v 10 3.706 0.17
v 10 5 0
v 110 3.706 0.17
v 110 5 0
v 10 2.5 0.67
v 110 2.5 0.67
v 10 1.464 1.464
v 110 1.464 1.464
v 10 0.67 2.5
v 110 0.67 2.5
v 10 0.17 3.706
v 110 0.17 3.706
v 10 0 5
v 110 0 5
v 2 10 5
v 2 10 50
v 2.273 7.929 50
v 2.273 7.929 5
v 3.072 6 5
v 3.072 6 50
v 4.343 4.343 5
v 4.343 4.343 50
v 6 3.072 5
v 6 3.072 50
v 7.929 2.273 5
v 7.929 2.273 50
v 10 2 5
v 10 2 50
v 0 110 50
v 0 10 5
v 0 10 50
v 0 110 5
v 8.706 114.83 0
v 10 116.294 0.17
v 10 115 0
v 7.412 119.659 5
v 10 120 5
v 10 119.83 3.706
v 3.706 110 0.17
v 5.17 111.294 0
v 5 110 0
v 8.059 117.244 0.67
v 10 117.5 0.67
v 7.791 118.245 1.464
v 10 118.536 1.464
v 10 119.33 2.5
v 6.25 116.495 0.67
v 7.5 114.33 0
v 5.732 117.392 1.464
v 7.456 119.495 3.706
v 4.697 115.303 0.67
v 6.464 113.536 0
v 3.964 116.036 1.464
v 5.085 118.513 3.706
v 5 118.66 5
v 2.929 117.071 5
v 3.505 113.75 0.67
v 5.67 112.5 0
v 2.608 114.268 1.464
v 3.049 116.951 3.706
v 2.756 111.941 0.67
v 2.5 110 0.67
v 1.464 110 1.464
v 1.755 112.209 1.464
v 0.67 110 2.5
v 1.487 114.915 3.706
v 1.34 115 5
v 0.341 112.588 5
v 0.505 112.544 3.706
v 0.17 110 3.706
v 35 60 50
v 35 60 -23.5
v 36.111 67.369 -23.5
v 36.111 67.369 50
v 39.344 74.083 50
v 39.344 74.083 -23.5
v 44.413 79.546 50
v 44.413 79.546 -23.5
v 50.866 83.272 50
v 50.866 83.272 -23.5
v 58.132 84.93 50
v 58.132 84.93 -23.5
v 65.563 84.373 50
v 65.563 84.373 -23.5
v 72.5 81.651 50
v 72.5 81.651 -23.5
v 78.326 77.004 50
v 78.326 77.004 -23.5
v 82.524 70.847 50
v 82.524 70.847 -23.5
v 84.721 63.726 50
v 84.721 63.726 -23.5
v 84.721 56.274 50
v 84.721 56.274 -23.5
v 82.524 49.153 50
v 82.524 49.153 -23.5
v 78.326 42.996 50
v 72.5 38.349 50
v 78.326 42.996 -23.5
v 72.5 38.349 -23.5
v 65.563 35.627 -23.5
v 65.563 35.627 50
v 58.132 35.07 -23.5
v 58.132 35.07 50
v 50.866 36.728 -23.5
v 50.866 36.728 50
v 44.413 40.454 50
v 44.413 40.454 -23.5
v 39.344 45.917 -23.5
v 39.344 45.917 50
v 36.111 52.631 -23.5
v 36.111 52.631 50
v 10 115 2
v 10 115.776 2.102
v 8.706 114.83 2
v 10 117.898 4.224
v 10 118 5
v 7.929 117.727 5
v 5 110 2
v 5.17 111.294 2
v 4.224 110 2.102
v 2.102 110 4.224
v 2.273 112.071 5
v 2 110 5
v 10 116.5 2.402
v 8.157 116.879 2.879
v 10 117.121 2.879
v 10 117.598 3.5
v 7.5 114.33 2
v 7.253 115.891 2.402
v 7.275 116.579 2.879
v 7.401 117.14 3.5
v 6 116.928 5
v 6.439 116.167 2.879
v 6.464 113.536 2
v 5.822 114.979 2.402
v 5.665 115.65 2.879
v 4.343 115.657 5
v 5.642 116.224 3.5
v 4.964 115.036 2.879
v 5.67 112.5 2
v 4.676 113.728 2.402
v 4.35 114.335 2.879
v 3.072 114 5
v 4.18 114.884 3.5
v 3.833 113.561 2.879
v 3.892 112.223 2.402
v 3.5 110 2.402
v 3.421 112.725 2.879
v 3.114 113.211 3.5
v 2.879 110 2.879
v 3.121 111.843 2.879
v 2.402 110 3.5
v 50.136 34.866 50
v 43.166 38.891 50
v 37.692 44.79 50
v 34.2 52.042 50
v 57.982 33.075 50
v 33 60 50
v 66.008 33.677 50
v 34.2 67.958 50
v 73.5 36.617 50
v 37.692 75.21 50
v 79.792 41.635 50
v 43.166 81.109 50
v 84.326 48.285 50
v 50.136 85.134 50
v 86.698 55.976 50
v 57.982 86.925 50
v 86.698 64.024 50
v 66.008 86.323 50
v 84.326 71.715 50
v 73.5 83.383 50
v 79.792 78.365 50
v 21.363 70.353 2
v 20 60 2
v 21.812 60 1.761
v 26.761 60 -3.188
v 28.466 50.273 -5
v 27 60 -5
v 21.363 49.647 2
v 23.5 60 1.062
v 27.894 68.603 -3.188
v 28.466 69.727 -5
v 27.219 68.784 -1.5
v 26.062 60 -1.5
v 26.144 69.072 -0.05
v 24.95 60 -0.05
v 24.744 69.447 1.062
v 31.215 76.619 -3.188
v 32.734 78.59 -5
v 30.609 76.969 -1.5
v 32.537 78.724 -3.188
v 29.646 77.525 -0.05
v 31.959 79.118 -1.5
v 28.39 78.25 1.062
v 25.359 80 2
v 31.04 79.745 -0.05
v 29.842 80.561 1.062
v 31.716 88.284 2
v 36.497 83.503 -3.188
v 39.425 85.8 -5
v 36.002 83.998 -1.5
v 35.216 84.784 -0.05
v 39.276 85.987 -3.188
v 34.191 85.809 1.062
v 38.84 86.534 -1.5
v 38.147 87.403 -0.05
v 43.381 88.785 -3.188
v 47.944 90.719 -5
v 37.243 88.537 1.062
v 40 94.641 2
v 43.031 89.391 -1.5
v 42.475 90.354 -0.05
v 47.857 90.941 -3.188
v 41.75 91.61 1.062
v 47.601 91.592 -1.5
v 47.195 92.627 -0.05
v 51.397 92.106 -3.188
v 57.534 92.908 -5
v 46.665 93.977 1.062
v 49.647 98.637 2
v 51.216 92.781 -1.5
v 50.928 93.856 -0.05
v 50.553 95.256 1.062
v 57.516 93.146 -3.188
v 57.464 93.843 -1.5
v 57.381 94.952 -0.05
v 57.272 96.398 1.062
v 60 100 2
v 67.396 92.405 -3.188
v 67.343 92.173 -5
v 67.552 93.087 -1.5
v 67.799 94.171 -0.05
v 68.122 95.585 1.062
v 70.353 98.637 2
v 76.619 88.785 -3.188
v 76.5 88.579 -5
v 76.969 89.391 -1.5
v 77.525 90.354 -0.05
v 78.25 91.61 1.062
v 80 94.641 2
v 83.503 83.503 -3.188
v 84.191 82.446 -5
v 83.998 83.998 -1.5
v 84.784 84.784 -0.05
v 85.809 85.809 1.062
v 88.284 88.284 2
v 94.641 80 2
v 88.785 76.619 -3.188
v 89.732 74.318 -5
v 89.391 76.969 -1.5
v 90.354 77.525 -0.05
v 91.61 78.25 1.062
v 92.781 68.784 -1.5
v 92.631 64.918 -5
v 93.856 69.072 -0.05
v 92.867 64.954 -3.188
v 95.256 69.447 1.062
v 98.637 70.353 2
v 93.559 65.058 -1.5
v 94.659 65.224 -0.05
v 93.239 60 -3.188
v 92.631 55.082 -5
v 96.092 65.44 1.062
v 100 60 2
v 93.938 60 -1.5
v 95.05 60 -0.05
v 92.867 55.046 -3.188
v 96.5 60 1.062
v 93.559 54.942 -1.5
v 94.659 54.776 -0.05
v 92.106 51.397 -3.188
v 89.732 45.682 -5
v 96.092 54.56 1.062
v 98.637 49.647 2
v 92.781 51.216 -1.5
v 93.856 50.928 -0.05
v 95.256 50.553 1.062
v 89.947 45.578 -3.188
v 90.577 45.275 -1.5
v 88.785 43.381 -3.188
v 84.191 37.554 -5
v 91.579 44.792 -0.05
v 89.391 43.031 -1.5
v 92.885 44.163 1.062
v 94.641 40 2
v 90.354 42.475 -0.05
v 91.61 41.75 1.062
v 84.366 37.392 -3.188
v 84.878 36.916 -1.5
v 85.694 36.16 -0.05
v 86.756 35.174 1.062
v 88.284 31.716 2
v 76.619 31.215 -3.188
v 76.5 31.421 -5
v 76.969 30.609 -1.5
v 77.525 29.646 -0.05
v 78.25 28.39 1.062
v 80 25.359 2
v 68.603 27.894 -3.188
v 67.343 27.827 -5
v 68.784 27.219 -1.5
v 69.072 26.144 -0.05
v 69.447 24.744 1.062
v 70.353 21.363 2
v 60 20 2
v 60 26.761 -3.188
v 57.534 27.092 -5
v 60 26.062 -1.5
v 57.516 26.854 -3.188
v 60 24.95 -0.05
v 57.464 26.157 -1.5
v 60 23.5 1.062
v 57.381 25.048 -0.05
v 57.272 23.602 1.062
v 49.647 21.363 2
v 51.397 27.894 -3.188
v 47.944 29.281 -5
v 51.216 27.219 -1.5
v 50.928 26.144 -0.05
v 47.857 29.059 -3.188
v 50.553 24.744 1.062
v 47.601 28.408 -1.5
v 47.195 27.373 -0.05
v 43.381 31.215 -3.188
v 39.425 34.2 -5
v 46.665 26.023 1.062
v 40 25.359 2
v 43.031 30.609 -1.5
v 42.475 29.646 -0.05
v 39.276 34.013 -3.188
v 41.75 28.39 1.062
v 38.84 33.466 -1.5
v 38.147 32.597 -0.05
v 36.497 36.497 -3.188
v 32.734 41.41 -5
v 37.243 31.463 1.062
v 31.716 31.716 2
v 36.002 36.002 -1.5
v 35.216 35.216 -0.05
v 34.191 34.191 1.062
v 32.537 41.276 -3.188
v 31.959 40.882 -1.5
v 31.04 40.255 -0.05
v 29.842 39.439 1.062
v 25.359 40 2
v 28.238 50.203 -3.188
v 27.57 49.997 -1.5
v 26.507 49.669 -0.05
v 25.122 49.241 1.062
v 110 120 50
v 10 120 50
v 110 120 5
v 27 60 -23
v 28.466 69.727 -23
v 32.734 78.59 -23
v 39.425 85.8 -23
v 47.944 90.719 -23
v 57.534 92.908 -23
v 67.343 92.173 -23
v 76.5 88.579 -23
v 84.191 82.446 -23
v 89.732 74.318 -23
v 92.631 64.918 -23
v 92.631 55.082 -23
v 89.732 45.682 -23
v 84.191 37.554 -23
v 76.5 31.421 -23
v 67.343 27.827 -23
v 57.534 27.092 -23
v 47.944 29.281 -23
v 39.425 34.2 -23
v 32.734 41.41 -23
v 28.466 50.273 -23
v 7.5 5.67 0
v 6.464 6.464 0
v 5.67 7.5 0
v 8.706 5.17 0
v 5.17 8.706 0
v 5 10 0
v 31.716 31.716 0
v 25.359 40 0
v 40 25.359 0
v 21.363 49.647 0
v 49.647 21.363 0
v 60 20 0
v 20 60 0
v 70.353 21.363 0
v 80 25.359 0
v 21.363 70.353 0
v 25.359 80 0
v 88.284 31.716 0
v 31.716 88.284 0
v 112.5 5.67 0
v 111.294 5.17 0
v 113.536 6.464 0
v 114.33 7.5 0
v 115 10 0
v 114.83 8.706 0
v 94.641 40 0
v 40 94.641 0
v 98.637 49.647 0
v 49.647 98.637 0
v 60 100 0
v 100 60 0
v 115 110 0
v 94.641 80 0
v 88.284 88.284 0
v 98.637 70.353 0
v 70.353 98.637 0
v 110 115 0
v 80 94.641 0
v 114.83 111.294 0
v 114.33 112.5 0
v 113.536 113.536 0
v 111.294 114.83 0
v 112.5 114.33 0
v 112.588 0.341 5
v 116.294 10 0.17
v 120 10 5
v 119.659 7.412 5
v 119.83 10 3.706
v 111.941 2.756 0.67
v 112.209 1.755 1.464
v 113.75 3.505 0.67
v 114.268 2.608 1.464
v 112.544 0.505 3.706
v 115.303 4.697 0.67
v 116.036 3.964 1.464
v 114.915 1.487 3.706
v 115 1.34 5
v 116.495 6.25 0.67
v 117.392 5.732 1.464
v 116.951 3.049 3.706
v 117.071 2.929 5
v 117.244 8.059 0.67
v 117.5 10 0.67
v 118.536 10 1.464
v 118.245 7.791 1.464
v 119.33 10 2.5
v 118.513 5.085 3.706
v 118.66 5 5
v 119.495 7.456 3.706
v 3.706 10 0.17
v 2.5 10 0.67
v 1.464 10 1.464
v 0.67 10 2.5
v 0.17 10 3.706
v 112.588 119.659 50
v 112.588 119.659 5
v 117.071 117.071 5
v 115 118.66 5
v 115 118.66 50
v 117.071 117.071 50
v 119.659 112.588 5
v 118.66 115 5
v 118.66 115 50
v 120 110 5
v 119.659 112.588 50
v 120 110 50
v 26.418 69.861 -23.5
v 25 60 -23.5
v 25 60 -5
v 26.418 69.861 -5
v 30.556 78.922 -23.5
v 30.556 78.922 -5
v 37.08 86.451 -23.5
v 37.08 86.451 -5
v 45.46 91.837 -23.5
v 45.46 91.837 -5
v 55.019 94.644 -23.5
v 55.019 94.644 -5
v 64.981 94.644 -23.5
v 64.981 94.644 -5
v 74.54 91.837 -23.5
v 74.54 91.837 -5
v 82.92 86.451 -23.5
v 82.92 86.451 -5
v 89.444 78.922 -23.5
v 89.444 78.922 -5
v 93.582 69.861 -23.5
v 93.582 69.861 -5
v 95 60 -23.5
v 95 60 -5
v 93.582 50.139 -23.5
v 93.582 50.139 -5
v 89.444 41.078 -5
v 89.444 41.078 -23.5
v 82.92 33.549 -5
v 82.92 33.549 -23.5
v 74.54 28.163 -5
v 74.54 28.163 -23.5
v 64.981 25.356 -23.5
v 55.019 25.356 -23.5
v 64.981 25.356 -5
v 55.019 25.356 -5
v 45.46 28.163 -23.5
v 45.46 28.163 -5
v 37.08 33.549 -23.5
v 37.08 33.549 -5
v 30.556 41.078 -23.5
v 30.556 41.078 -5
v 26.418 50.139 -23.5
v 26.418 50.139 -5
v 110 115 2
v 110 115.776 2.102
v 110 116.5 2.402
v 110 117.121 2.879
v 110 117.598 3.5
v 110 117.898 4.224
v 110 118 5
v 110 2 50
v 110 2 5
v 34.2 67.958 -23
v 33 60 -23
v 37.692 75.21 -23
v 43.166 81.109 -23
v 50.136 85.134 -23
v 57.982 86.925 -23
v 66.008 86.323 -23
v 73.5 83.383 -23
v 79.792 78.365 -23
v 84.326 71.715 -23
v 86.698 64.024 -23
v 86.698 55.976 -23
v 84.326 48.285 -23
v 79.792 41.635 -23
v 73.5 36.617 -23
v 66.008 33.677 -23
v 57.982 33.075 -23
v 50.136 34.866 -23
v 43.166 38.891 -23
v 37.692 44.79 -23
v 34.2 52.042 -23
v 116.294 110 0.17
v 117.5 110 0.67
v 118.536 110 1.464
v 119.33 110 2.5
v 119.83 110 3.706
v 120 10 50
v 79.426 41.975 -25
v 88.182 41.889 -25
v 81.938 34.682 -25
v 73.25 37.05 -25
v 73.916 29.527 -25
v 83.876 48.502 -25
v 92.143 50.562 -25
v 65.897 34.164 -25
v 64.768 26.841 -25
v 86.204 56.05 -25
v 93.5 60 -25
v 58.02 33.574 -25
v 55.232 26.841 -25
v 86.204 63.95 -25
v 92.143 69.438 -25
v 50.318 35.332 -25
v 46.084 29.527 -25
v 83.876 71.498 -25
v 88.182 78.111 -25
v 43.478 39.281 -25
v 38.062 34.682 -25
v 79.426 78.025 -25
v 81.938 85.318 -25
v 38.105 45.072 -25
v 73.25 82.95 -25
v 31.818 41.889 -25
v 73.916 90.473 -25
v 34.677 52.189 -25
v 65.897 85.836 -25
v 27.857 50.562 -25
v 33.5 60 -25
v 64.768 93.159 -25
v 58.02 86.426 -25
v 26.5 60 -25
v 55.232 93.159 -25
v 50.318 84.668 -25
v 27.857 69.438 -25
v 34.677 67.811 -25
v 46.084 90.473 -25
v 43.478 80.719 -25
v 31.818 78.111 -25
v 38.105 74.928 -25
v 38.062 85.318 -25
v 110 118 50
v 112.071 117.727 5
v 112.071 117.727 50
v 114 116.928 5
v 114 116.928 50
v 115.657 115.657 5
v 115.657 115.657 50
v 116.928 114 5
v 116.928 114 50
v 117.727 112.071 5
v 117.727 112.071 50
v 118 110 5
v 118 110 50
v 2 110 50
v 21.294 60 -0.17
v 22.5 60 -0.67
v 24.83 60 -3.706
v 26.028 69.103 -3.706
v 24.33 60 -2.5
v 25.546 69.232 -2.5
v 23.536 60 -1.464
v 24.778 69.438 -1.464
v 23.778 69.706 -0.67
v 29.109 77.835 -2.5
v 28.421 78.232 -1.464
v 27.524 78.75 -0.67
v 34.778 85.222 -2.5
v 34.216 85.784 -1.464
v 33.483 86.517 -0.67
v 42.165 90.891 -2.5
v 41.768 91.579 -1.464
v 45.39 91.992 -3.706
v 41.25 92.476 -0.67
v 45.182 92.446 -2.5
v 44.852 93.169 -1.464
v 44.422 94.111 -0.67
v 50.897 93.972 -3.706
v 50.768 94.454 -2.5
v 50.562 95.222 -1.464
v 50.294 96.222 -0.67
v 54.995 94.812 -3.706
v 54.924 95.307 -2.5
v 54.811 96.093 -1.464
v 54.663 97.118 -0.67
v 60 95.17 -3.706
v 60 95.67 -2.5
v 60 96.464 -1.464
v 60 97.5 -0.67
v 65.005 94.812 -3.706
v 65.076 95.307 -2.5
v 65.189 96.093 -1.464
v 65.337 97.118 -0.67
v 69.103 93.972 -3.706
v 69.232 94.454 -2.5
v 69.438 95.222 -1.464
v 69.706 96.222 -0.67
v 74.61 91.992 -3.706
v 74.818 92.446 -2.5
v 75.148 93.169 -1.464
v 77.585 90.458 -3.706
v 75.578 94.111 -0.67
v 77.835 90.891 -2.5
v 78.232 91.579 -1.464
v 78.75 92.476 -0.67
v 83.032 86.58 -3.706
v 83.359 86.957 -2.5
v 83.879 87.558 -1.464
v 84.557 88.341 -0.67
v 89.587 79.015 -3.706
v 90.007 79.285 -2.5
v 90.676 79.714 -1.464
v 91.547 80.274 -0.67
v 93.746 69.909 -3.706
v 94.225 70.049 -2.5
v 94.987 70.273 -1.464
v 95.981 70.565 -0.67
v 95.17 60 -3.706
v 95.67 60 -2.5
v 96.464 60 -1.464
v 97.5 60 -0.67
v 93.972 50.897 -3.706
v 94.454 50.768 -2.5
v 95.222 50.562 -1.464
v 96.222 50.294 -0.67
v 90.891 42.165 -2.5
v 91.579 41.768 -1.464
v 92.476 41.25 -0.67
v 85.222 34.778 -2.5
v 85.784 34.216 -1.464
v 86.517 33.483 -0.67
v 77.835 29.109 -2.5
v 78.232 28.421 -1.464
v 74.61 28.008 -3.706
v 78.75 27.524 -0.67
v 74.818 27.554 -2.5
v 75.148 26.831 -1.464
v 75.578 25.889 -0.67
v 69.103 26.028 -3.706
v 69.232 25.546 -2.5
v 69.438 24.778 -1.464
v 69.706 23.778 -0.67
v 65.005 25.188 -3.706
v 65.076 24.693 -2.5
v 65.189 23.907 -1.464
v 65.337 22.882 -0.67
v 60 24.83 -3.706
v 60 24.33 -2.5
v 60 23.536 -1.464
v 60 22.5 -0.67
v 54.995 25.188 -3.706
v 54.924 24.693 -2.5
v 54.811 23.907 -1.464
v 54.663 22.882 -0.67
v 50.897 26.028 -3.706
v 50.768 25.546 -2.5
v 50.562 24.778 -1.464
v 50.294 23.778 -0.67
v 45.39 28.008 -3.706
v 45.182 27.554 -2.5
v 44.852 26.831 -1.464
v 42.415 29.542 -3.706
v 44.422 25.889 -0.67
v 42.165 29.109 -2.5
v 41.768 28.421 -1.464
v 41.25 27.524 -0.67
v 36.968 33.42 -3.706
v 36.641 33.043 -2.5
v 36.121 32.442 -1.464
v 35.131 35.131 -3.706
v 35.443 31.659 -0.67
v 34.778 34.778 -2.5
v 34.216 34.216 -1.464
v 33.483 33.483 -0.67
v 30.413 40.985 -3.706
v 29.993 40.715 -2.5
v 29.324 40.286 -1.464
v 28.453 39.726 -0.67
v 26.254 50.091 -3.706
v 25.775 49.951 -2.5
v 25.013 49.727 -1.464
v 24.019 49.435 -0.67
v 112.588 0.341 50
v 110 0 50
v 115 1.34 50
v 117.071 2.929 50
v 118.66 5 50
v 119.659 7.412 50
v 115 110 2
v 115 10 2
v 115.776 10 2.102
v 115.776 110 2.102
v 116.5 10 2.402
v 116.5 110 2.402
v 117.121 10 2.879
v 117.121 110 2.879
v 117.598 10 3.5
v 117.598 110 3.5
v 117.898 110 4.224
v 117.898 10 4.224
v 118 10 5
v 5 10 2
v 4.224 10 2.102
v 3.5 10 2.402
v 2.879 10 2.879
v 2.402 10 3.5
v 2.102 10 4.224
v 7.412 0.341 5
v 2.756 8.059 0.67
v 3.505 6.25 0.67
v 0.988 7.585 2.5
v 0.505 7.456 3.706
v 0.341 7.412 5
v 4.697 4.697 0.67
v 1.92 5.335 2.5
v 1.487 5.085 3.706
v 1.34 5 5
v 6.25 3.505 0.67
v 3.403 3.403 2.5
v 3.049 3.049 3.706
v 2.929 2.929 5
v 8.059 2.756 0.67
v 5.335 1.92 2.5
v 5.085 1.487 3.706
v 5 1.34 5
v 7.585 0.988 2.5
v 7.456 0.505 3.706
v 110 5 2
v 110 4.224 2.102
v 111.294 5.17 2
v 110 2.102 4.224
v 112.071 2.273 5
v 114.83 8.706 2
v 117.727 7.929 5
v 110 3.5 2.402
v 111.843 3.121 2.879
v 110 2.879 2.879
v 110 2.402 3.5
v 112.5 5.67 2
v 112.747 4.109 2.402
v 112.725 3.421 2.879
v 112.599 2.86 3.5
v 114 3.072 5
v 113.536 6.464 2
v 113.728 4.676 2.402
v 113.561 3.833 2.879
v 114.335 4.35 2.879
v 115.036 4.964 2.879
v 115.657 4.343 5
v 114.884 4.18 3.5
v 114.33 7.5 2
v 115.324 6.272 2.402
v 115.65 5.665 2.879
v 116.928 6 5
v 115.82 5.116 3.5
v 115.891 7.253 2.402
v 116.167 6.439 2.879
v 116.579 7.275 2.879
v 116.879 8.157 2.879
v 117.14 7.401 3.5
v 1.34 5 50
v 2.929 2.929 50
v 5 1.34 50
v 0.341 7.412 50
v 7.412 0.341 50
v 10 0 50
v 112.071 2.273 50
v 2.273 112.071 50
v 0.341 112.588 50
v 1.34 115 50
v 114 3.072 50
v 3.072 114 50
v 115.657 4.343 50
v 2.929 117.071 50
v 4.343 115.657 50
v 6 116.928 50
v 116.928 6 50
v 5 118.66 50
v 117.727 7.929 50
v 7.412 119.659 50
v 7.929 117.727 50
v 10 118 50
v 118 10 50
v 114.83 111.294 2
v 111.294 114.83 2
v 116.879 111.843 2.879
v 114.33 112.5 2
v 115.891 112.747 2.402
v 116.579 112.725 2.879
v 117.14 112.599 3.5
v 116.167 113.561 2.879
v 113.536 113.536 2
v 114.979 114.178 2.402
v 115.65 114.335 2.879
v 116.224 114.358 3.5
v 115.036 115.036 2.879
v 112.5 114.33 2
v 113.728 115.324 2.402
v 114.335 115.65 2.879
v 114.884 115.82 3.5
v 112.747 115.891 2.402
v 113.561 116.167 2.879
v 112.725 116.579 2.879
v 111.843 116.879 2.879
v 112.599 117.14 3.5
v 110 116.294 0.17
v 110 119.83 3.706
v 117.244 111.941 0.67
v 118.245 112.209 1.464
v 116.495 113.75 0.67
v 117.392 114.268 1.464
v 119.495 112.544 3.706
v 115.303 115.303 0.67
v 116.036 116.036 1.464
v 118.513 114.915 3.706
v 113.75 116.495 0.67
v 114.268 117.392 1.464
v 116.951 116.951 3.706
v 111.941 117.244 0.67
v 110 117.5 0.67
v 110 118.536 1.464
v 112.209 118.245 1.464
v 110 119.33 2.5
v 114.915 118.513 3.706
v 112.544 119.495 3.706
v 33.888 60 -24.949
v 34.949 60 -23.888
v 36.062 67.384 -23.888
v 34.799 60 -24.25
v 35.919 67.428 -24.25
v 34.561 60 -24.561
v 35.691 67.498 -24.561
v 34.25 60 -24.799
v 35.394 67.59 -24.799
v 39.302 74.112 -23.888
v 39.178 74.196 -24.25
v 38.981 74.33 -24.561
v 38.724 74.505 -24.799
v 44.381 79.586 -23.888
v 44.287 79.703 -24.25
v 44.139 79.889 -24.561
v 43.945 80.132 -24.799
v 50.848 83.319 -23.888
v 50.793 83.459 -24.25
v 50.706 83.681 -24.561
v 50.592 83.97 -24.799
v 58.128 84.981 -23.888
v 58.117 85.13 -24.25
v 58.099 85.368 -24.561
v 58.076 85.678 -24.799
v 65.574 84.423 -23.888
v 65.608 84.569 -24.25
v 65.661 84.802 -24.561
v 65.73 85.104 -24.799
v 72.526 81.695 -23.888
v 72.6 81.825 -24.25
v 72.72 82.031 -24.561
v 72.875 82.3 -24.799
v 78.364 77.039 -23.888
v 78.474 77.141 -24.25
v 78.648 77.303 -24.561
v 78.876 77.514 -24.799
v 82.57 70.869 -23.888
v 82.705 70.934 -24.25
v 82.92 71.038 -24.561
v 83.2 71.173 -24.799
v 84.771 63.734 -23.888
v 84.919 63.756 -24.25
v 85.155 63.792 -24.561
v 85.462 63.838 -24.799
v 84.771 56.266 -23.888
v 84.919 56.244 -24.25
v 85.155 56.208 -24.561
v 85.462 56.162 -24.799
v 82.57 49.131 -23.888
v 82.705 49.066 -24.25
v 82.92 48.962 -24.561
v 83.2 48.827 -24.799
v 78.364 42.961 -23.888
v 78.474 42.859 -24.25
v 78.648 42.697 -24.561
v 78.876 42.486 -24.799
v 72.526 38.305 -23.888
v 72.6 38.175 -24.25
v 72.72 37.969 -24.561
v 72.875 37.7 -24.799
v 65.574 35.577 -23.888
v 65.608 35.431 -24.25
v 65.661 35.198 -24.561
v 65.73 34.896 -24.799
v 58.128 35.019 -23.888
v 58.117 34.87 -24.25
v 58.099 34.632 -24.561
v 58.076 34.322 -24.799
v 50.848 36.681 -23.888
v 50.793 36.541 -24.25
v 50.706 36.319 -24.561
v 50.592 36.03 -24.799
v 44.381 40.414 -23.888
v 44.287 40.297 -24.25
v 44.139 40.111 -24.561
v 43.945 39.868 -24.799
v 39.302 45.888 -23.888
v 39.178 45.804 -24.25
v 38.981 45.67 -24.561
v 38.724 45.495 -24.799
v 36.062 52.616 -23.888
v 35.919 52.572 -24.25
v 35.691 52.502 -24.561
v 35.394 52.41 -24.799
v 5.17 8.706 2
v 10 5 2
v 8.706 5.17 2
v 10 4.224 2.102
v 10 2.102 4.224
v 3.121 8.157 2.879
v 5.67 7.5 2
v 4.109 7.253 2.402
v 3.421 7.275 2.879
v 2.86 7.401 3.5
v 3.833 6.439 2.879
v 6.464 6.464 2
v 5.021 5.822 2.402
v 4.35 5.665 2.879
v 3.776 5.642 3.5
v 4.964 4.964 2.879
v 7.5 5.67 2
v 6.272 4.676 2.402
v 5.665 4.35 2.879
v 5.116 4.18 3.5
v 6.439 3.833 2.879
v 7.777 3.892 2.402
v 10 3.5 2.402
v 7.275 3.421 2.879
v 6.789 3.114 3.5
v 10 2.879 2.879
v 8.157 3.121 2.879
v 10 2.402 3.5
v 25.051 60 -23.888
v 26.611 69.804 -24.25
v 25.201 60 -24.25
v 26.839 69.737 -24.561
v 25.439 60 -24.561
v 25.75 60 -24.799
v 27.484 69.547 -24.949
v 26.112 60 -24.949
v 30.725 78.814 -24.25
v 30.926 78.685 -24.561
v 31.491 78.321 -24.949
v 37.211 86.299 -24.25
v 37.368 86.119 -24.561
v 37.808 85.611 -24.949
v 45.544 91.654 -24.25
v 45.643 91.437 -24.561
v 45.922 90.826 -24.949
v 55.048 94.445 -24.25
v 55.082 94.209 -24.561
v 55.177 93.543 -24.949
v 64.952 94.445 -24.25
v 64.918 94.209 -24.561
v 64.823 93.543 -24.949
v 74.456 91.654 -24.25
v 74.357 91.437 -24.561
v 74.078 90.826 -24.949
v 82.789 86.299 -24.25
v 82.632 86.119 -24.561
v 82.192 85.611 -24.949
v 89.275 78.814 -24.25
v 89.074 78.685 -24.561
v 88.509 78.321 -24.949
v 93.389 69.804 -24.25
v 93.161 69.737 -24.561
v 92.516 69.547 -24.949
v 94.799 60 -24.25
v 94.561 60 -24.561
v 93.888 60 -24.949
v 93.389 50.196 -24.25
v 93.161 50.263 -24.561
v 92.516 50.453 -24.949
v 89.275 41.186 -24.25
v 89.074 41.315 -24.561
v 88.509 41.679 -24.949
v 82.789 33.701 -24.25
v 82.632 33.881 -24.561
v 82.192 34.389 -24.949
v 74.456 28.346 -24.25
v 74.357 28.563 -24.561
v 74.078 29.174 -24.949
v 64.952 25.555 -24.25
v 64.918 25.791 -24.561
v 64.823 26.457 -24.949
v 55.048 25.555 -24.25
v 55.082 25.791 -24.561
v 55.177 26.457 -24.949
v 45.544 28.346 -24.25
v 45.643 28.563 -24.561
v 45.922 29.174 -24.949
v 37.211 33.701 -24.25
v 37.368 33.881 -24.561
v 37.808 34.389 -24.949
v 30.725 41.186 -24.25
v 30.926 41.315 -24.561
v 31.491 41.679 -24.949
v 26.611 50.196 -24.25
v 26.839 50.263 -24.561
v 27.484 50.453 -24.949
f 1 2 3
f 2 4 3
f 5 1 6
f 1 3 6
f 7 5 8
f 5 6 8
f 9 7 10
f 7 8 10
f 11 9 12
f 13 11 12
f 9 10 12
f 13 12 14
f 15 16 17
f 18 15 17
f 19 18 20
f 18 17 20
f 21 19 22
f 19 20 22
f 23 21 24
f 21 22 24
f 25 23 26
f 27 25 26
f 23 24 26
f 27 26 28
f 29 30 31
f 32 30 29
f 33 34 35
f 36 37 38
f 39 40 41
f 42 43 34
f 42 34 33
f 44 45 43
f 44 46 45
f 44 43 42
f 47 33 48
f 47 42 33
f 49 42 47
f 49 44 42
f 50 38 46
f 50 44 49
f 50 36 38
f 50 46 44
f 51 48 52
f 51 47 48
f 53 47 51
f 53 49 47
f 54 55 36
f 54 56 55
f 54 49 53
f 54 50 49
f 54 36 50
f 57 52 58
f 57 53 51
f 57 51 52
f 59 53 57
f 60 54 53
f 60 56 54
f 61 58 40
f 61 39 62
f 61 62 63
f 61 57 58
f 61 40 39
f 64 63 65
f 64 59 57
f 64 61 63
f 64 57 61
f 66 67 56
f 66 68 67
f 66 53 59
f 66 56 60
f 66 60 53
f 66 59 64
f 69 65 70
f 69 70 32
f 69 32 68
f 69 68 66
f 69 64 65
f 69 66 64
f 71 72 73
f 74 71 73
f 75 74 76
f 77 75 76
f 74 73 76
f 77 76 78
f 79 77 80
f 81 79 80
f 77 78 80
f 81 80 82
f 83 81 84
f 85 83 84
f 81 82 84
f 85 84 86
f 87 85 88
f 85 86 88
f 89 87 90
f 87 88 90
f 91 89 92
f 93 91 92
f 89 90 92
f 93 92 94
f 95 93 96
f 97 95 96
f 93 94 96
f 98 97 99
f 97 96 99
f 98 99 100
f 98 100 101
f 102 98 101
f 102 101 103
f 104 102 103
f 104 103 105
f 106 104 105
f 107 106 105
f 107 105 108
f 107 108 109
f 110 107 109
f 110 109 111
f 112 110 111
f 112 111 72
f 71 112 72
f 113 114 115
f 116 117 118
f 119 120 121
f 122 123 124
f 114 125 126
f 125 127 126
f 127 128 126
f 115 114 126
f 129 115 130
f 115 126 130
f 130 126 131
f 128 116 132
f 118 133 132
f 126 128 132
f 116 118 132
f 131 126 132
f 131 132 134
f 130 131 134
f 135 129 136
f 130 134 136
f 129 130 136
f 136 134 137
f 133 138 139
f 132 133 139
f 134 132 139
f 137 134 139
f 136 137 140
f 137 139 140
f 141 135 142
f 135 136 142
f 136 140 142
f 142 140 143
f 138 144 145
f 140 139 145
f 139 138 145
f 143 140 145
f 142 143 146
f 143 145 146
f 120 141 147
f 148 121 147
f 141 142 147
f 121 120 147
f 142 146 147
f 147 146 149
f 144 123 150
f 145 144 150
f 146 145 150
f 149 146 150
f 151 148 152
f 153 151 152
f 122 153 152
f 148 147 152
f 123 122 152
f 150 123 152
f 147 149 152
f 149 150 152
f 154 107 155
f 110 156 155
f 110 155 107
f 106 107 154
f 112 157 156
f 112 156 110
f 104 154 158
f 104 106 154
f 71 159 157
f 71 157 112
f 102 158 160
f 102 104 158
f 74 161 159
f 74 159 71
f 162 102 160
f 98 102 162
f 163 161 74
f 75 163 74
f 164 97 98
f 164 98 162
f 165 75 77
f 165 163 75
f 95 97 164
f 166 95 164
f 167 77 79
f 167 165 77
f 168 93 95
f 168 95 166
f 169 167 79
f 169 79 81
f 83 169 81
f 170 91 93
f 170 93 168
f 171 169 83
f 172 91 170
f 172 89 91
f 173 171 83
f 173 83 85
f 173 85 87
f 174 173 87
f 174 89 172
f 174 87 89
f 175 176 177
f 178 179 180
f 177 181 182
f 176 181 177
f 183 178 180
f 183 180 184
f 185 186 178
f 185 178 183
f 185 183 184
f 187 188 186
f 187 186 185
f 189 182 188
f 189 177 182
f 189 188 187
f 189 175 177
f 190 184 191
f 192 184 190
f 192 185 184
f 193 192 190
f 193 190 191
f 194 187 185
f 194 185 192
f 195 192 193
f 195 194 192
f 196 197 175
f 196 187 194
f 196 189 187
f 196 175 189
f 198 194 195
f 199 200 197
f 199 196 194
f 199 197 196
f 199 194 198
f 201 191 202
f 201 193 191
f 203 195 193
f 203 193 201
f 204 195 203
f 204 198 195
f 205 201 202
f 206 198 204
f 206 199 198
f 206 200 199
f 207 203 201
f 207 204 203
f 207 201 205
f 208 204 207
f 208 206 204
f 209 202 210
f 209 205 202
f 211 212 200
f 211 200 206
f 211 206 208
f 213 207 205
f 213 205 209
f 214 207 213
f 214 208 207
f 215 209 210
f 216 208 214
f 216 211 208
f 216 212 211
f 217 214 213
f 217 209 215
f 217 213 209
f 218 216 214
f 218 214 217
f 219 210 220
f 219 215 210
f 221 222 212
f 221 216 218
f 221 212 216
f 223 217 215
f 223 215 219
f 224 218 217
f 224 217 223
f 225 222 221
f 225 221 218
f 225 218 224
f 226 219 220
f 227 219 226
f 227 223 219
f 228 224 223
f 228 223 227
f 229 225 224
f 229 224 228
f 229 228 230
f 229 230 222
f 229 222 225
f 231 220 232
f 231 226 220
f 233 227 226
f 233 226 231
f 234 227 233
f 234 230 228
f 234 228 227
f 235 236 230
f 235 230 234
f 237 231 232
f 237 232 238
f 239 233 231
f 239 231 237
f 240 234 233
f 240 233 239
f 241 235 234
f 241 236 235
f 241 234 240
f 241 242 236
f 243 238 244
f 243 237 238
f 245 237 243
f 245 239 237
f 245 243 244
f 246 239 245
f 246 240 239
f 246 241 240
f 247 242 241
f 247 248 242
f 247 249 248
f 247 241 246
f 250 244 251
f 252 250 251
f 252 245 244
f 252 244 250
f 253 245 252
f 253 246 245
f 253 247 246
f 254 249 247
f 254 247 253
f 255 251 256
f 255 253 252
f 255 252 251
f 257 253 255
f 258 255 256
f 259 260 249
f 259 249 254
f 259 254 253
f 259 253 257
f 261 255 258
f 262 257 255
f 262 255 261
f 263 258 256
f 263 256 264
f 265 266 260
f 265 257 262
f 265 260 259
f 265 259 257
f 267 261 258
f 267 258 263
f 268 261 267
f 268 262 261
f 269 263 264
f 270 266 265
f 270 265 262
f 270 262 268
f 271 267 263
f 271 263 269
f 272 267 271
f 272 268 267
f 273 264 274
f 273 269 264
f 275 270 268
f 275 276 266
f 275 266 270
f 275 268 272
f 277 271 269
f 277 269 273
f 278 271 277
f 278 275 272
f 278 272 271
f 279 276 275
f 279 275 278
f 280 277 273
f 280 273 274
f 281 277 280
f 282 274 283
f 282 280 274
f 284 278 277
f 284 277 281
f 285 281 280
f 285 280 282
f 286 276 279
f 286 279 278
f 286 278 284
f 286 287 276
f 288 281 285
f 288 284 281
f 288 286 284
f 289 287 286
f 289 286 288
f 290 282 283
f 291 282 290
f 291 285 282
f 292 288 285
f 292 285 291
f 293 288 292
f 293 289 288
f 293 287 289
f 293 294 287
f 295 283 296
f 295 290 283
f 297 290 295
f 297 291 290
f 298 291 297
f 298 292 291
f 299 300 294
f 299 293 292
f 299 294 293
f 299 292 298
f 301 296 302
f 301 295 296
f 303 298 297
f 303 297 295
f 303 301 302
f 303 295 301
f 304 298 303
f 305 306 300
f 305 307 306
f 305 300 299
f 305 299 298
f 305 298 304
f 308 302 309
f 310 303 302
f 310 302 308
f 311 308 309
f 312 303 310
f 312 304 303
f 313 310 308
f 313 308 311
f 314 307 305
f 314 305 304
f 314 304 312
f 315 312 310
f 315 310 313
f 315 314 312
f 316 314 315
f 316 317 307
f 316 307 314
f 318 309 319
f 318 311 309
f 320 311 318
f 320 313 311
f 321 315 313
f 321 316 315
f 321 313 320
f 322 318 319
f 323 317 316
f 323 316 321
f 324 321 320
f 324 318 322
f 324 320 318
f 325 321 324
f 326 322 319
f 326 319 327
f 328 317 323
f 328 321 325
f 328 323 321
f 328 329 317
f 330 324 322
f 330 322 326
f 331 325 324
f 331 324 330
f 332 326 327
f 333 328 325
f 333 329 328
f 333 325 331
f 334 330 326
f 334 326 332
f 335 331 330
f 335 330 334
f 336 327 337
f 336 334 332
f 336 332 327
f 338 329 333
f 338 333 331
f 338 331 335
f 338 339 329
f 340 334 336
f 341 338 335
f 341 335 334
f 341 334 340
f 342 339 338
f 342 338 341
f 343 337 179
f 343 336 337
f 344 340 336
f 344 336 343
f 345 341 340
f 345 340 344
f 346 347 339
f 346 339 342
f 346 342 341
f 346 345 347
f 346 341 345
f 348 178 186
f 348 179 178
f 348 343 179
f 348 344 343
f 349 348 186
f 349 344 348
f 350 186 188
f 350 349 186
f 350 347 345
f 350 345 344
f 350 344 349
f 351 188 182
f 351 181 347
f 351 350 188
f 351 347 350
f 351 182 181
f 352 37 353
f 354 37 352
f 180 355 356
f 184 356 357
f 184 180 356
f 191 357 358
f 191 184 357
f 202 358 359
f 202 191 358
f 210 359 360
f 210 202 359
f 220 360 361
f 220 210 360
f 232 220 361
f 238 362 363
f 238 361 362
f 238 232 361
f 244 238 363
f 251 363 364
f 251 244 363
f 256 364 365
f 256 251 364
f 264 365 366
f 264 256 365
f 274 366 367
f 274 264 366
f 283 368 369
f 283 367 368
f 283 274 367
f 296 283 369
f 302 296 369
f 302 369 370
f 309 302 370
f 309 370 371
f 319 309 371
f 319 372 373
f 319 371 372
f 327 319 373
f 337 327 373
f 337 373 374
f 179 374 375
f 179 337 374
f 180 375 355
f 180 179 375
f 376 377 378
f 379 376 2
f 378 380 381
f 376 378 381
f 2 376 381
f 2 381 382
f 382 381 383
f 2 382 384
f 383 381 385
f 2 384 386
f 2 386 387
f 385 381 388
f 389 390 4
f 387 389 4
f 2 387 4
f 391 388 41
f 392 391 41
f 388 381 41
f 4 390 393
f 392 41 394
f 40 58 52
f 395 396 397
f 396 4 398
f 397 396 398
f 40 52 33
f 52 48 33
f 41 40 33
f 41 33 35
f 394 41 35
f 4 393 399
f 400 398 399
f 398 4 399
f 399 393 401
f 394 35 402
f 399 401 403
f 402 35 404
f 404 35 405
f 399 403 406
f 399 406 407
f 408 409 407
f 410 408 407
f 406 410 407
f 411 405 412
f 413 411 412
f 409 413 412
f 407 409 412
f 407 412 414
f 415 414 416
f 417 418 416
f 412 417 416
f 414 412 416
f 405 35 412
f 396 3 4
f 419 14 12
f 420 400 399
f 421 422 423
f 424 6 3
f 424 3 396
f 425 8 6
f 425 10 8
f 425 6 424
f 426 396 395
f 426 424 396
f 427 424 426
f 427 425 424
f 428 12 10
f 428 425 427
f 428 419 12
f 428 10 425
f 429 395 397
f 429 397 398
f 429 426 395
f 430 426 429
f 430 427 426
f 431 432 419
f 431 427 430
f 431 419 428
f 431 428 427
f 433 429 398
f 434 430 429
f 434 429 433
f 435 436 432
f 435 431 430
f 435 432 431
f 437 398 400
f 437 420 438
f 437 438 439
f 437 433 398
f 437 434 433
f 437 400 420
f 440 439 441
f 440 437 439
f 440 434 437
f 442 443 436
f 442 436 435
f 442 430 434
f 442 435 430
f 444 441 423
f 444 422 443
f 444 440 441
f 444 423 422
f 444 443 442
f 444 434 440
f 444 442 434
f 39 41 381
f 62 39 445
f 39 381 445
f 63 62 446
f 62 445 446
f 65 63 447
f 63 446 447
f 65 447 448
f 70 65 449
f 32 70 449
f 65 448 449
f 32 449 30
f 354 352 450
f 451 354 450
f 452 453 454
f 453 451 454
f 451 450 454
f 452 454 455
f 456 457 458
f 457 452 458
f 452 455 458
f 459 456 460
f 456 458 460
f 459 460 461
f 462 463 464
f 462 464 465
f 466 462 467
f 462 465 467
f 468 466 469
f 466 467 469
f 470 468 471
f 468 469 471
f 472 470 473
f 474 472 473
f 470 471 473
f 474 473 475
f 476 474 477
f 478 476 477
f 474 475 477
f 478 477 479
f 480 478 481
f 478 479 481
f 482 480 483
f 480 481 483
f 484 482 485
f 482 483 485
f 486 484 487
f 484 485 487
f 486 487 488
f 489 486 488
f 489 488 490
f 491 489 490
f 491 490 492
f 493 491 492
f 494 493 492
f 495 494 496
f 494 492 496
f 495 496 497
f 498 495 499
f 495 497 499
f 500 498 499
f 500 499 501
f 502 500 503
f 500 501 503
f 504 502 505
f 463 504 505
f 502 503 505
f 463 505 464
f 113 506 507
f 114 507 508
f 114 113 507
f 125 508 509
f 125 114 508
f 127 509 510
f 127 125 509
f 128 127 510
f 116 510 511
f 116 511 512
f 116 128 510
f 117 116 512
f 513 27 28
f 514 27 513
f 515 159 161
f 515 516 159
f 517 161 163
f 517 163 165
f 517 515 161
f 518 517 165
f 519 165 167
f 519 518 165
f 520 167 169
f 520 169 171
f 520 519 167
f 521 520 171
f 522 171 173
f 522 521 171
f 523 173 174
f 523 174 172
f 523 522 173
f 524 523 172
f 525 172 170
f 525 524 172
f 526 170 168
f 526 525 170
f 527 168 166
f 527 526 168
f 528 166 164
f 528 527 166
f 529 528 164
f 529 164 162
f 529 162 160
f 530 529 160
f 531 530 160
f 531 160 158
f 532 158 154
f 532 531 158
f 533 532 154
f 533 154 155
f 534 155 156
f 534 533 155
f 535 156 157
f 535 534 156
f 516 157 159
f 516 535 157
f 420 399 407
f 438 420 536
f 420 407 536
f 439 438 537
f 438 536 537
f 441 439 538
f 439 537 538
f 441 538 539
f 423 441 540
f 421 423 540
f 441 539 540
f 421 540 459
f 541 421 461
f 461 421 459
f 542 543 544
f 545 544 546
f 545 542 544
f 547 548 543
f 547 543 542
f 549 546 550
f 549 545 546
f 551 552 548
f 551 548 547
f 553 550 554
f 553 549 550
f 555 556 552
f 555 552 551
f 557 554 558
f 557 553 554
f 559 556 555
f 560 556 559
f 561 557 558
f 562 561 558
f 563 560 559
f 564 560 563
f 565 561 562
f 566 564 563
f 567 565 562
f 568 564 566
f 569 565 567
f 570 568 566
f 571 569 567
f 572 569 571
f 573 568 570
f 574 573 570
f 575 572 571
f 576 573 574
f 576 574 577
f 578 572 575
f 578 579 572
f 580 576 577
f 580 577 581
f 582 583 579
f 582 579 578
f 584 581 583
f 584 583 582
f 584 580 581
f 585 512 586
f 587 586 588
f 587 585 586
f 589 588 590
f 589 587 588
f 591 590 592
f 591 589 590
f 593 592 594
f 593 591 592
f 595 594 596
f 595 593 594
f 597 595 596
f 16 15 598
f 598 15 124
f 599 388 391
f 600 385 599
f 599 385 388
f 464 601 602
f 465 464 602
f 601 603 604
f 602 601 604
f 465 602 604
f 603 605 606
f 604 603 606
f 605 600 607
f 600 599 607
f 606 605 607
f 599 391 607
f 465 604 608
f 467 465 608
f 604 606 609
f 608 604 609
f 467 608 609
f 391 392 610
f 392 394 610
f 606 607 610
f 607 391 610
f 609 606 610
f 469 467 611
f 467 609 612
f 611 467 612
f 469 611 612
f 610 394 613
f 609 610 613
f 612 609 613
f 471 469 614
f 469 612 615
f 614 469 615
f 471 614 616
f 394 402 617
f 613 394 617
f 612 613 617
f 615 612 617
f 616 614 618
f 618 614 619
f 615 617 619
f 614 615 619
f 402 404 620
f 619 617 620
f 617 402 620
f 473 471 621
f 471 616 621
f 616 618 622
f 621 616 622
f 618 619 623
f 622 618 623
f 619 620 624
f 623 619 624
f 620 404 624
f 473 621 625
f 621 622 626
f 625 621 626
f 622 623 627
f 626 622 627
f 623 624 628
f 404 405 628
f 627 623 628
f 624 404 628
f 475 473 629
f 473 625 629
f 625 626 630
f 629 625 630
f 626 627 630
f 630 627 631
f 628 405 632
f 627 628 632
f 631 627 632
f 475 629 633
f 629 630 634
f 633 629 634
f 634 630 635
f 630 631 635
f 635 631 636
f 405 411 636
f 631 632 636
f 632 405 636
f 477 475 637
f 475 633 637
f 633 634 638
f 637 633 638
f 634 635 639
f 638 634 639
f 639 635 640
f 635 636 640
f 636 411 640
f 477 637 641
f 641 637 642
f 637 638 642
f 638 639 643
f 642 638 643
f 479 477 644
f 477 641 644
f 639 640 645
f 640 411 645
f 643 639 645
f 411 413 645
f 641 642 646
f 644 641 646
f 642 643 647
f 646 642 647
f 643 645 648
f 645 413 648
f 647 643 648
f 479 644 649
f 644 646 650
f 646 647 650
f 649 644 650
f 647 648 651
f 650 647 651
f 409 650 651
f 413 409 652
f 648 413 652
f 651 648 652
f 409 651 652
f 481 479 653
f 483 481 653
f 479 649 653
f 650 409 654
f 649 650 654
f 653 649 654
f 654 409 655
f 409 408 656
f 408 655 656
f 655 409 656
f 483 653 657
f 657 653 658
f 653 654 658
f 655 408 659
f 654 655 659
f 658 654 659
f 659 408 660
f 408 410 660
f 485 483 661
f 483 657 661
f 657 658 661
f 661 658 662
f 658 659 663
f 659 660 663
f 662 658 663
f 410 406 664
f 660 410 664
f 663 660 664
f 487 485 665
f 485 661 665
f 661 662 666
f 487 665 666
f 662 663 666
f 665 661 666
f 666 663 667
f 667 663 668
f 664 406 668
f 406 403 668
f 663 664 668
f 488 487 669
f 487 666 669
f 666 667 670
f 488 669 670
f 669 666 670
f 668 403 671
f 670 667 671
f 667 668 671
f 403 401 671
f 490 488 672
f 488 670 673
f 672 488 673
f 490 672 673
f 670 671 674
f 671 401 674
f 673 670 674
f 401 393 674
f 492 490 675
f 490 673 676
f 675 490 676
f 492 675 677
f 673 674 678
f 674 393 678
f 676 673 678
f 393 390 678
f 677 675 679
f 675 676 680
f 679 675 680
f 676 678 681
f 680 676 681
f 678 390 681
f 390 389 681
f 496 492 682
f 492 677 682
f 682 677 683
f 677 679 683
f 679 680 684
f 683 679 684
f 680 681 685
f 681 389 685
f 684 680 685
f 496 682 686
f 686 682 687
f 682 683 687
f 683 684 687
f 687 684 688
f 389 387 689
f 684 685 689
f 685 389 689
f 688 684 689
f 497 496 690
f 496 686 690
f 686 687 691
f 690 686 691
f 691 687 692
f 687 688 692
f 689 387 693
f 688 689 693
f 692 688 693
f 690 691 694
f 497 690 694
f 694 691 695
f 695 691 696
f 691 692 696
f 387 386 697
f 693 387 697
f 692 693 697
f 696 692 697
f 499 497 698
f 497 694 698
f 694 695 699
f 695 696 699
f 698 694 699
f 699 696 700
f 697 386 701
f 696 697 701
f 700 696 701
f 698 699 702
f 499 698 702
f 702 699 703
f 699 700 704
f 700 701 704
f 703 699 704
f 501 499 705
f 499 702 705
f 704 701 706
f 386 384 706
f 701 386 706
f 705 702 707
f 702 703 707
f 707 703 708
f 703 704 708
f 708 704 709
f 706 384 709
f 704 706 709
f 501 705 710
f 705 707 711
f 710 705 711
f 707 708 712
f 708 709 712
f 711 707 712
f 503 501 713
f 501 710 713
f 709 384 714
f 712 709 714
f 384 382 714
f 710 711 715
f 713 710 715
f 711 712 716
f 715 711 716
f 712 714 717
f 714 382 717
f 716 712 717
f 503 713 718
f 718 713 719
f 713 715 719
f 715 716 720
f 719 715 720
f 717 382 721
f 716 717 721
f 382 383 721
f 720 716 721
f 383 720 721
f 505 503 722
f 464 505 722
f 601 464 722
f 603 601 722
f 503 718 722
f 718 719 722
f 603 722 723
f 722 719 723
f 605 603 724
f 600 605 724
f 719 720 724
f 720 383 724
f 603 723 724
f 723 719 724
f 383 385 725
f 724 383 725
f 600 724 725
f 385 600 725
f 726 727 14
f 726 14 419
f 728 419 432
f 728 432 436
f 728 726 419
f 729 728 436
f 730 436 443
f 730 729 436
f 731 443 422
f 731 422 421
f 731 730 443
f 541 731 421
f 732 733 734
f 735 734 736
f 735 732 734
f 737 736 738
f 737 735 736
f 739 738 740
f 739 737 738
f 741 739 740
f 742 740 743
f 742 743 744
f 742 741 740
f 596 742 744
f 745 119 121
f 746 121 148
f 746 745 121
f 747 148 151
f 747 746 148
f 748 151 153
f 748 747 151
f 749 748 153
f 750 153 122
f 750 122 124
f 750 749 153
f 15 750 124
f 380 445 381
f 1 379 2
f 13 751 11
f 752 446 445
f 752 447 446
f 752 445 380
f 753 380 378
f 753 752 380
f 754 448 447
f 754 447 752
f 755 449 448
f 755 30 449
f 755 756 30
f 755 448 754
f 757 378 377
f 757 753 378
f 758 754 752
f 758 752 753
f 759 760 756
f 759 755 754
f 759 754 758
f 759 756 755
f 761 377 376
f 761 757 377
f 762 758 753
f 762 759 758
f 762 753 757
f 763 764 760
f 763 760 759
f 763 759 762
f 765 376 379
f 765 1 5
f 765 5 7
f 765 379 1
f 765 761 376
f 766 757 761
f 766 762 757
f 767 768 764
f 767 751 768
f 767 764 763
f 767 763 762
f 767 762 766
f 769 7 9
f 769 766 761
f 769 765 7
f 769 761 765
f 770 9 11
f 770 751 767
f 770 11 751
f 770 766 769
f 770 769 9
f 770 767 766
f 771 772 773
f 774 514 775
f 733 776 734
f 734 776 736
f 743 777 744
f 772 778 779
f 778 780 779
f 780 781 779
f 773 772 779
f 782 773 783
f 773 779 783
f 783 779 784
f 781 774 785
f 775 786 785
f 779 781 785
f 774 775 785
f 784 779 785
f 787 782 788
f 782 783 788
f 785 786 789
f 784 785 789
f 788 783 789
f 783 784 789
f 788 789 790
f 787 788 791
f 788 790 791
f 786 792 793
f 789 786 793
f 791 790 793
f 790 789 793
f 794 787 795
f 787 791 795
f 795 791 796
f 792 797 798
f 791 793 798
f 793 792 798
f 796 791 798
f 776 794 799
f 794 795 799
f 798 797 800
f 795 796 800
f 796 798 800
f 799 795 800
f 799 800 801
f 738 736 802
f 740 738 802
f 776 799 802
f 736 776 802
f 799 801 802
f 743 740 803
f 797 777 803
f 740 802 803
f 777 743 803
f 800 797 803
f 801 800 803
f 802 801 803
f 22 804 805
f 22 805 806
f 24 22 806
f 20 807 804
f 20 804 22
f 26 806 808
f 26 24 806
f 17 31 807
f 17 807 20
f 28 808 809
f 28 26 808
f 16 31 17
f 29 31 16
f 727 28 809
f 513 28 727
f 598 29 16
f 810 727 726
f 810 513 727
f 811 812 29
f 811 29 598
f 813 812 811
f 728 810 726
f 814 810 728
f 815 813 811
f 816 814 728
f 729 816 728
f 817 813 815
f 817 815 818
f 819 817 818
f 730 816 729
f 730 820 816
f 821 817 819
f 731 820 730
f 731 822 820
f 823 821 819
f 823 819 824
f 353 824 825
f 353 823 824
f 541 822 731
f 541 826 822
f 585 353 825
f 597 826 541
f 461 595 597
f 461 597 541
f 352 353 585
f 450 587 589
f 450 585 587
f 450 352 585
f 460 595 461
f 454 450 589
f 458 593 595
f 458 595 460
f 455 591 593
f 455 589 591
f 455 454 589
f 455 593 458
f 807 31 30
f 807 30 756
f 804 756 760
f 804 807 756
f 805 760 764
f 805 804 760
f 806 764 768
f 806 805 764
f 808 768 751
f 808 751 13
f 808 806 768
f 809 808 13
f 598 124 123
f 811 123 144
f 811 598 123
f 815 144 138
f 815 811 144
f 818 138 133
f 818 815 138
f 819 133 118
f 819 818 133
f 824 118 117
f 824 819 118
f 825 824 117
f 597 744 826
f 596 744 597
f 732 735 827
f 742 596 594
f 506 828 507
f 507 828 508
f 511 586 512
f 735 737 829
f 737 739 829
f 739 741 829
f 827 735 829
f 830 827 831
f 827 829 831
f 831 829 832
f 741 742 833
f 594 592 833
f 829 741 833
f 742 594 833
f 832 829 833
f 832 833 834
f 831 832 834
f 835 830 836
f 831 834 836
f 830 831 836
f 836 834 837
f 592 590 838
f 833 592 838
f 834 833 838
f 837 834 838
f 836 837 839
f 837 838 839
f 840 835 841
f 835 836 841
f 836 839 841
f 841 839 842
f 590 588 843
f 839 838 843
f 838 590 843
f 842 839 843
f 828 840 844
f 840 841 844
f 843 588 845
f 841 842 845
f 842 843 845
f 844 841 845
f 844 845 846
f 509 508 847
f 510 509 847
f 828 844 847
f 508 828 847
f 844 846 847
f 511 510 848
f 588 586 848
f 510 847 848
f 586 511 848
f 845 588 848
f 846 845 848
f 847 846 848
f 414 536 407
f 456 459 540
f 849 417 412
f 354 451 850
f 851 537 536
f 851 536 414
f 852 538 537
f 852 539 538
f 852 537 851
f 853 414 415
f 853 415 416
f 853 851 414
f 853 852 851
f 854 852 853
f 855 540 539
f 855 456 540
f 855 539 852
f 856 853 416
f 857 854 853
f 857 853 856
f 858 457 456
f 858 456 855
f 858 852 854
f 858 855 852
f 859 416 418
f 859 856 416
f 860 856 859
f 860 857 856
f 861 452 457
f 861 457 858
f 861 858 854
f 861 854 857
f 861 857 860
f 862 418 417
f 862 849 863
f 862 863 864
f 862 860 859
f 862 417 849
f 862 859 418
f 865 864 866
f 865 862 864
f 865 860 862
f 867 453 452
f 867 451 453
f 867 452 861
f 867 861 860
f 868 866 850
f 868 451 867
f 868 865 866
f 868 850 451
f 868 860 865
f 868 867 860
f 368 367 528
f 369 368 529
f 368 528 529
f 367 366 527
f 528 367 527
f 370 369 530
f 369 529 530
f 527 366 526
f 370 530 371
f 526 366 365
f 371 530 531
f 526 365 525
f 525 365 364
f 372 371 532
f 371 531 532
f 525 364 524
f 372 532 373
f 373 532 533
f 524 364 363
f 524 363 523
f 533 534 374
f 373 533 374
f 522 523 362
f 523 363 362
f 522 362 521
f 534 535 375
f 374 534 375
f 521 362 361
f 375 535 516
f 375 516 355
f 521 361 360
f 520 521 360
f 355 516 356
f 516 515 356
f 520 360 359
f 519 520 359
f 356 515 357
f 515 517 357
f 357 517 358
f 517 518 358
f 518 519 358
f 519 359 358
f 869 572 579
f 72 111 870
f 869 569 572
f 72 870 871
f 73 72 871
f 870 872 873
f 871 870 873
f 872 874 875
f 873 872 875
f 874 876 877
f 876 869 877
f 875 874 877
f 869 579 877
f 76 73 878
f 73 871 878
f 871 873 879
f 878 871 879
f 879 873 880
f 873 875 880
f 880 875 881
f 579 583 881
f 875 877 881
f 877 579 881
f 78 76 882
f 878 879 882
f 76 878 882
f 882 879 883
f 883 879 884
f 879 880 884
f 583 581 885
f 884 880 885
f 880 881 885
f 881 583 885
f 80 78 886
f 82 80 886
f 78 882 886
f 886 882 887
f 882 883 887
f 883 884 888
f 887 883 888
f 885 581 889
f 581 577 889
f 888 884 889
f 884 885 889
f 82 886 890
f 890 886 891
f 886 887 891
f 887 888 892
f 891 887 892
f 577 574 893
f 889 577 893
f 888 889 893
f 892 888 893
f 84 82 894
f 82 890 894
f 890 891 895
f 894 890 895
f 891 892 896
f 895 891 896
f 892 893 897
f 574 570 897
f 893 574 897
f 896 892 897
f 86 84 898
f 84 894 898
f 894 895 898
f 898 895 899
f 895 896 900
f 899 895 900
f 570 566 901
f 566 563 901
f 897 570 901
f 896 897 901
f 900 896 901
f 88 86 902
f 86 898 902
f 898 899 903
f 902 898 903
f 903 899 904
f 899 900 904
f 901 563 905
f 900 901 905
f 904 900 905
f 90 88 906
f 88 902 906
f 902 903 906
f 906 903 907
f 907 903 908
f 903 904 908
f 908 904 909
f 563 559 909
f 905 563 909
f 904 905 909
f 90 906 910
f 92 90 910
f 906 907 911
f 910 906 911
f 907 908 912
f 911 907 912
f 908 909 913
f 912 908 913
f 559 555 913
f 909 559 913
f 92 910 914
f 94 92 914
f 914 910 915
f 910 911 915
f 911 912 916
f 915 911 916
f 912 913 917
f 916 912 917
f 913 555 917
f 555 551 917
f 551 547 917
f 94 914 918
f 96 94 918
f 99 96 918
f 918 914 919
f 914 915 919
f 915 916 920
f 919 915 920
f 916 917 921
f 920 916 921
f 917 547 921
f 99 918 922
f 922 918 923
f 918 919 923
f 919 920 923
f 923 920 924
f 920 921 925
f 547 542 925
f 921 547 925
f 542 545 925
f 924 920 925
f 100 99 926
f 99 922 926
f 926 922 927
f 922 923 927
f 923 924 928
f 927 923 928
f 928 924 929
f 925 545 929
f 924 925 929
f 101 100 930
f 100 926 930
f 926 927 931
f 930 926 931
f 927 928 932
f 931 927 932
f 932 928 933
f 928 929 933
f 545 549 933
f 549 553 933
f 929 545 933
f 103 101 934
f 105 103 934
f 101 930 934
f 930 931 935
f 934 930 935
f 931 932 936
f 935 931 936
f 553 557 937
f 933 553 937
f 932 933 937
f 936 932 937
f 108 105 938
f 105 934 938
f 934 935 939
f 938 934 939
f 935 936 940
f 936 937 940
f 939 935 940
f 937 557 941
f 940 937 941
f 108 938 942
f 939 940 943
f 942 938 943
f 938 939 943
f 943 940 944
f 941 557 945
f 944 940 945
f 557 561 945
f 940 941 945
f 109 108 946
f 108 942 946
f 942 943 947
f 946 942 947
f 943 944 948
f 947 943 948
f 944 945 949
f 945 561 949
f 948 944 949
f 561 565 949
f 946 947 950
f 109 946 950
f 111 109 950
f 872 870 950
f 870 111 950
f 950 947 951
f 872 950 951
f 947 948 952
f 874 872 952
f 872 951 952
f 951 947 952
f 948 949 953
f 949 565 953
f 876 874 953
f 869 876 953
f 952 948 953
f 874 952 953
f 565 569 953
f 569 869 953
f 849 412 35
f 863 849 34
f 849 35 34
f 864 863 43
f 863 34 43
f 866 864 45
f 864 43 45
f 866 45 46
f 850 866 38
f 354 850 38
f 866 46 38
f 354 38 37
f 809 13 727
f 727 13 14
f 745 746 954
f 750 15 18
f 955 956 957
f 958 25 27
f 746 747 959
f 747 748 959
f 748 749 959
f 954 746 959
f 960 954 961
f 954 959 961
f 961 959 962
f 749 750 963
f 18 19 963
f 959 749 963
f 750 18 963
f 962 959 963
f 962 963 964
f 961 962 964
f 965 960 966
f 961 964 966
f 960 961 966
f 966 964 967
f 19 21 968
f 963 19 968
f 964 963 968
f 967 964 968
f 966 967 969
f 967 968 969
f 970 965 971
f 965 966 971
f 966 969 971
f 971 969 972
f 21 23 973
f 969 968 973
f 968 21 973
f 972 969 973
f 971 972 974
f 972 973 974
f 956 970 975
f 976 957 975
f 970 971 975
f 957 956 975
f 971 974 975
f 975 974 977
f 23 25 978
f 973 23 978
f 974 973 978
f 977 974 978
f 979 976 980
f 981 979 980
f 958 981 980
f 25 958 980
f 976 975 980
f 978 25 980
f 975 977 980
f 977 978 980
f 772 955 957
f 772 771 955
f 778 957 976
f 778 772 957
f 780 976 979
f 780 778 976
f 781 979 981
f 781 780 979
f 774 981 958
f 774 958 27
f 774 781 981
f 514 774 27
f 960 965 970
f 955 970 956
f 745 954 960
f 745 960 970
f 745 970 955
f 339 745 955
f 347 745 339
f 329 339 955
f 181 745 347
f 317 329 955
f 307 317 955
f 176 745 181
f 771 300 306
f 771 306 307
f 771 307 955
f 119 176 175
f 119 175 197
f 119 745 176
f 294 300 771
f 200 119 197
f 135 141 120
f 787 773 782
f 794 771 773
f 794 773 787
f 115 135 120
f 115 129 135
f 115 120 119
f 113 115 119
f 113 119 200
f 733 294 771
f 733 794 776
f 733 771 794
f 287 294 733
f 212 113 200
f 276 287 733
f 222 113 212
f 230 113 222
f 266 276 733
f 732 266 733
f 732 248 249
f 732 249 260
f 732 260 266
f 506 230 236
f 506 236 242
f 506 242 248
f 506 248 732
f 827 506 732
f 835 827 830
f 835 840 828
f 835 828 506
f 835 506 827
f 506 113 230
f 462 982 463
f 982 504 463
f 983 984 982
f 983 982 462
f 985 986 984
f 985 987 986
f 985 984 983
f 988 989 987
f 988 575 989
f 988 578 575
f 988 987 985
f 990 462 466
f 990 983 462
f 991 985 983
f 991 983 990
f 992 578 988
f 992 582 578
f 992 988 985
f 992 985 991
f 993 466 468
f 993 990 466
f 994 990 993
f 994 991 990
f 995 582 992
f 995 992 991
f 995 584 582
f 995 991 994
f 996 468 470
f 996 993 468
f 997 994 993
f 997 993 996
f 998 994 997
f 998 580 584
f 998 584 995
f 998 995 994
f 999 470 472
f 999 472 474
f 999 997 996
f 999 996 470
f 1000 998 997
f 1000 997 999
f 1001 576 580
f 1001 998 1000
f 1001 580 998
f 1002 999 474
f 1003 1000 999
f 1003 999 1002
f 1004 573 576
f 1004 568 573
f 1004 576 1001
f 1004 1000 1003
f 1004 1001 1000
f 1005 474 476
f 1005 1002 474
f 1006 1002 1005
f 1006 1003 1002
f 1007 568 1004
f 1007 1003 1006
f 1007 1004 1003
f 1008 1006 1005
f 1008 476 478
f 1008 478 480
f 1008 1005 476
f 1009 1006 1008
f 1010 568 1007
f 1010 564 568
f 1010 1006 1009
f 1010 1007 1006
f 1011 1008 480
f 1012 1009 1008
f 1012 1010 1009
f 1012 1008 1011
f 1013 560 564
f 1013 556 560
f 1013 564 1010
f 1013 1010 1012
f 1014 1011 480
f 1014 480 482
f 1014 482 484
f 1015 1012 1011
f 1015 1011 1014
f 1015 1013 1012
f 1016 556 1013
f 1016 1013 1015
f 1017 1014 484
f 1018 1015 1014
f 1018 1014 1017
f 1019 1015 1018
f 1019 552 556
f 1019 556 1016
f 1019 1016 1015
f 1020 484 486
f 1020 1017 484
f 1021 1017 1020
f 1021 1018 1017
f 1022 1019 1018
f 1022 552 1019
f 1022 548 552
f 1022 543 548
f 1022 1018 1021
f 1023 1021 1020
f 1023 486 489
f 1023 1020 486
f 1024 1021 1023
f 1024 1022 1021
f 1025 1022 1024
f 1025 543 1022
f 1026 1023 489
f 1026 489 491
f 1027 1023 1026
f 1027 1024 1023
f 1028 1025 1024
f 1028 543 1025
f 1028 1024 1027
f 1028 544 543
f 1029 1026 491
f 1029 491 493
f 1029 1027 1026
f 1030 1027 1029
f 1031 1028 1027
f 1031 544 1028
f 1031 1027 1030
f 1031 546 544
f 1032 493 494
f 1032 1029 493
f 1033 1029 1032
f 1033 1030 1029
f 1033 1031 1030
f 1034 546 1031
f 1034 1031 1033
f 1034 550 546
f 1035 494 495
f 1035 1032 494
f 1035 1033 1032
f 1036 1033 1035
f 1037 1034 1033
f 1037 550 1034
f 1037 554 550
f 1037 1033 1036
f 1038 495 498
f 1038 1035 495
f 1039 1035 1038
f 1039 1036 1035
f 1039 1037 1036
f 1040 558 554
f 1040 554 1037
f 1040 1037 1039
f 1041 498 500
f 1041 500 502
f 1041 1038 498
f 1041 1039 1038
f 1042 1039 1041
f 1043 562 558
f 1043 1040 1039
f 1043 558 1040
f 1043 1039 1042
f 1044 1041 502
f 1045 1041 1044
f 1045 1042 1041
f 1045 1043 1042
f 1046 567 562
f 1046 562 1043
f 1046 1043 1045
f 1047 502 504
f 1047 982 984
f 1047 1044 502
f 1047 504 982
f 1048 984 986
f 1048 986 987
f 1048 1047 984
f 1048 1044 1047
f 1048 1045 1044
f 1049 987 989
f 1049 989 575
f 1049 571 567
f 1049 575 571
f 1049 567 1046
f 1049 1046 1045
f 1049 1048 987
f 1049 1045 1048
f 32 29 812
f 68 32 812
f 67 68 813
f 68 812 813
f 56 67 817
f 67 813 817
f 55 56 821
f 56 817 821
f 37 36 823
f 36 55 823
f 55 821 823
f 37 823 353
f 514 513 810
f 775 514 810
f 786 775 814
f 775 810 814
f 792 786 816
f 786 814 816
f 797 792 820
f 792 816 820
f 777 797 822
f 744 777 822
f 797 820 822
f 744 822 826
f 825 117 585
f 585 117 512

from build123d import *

# Parameters (mm, degrees)
SKETCH2_W           = 120
SKETCH2_H           = 120
BOSS_EXTRUDE2_DEPTH = 50
SKETCH4_R           = 35
BOSS_EXTRUDE3_DEPTH = 25
SKETCH5_R           = 25
CUT_EXTRUDE1_DEPTH  = 186.539753153
FILLET1_R           = 10
FILLET2_R           = 1.5
FILLET3_R           = 5
SHELL2_T            = -2


with BuildPart() as part:
    # Sketch2 → Boss-Extrude2 (new body)
    with BuildSketch(Plane.XY):
        with Locations((60, 60)):
            Rectangle(SKETCH2_W, SKETCH2_H)
    extrude(amount=BOSS_EXTRUDE2_DEPTH)

    # Sketch4 → Boss-Extrude3 (add)
    with BuildSketch(Plane(origin=(0, 0, 0), x_dir=(-1, 0, 0), z_dir=(0, 0, -1))):
        with Locations((-60, 60)):
            Circle(SKETCH4_R)
    extrude(amount=BOSS_EXTRUDE3_DEPTH)

    # Sketch5 → Cut-Extrude1 (cut, through all)
    with BuildSketch(Plane(origin=(0, 0, -25), x_dir=(-1, 0, 0), z_dir=(0, 0, -1))):
        with Locations((-60, 60)):
            Circle(SKETCH5_R)
    extrude(amount=-CUT_EXTRUDE1_DEPTH, mode=Mode.SUBTRACT)

    # Fillet1
    fillet1_edges = [part.edges().sort_by_distance(p)[0] for p in [
        (0, 120, 25),
        (120, 120, 25),
        (120, 0, 25),
        (0, 0, 25),
    ]]
    fillet(fillet1_edges, radius=FILLET1_R)

    # Fillet2
    fillet2_edges = [part.edges().sort_by_distance(p)[0] for p in [
        (95, 60, -25),
        (85, 60, -25),
    ]]
    fillet(fillet2_edges, radius=FILLET2_R)

    # Fillet3
    fillet3_edges = [part.edges().sort_by_distance(p)[0] for p in [
        (95, 60, 0),
        (60, 0, 0),
        (0, 60, 0),
        (60, 120, 0),
        (120, 60, 0),
        (2.928932188, 117.071067812, 0),
        (117.071067812, 117.071067812, 0),
        (117.071067812, 2.928932188, 0),
        (2.928932188, 2.928932188, 0),
    ]]
    fillet(fillet3_edges, radius=FILLET3_R)

    # Shell2
    shell2_openings = [part.faces().sort_by_distance(p)[0] for p in [
        (60, 1.697056275, 50),
    ]]
    offset(amount=SHELL2_T, openings=shell2_openings, kind=Kind.INTERSECTION)


solid = part.part
